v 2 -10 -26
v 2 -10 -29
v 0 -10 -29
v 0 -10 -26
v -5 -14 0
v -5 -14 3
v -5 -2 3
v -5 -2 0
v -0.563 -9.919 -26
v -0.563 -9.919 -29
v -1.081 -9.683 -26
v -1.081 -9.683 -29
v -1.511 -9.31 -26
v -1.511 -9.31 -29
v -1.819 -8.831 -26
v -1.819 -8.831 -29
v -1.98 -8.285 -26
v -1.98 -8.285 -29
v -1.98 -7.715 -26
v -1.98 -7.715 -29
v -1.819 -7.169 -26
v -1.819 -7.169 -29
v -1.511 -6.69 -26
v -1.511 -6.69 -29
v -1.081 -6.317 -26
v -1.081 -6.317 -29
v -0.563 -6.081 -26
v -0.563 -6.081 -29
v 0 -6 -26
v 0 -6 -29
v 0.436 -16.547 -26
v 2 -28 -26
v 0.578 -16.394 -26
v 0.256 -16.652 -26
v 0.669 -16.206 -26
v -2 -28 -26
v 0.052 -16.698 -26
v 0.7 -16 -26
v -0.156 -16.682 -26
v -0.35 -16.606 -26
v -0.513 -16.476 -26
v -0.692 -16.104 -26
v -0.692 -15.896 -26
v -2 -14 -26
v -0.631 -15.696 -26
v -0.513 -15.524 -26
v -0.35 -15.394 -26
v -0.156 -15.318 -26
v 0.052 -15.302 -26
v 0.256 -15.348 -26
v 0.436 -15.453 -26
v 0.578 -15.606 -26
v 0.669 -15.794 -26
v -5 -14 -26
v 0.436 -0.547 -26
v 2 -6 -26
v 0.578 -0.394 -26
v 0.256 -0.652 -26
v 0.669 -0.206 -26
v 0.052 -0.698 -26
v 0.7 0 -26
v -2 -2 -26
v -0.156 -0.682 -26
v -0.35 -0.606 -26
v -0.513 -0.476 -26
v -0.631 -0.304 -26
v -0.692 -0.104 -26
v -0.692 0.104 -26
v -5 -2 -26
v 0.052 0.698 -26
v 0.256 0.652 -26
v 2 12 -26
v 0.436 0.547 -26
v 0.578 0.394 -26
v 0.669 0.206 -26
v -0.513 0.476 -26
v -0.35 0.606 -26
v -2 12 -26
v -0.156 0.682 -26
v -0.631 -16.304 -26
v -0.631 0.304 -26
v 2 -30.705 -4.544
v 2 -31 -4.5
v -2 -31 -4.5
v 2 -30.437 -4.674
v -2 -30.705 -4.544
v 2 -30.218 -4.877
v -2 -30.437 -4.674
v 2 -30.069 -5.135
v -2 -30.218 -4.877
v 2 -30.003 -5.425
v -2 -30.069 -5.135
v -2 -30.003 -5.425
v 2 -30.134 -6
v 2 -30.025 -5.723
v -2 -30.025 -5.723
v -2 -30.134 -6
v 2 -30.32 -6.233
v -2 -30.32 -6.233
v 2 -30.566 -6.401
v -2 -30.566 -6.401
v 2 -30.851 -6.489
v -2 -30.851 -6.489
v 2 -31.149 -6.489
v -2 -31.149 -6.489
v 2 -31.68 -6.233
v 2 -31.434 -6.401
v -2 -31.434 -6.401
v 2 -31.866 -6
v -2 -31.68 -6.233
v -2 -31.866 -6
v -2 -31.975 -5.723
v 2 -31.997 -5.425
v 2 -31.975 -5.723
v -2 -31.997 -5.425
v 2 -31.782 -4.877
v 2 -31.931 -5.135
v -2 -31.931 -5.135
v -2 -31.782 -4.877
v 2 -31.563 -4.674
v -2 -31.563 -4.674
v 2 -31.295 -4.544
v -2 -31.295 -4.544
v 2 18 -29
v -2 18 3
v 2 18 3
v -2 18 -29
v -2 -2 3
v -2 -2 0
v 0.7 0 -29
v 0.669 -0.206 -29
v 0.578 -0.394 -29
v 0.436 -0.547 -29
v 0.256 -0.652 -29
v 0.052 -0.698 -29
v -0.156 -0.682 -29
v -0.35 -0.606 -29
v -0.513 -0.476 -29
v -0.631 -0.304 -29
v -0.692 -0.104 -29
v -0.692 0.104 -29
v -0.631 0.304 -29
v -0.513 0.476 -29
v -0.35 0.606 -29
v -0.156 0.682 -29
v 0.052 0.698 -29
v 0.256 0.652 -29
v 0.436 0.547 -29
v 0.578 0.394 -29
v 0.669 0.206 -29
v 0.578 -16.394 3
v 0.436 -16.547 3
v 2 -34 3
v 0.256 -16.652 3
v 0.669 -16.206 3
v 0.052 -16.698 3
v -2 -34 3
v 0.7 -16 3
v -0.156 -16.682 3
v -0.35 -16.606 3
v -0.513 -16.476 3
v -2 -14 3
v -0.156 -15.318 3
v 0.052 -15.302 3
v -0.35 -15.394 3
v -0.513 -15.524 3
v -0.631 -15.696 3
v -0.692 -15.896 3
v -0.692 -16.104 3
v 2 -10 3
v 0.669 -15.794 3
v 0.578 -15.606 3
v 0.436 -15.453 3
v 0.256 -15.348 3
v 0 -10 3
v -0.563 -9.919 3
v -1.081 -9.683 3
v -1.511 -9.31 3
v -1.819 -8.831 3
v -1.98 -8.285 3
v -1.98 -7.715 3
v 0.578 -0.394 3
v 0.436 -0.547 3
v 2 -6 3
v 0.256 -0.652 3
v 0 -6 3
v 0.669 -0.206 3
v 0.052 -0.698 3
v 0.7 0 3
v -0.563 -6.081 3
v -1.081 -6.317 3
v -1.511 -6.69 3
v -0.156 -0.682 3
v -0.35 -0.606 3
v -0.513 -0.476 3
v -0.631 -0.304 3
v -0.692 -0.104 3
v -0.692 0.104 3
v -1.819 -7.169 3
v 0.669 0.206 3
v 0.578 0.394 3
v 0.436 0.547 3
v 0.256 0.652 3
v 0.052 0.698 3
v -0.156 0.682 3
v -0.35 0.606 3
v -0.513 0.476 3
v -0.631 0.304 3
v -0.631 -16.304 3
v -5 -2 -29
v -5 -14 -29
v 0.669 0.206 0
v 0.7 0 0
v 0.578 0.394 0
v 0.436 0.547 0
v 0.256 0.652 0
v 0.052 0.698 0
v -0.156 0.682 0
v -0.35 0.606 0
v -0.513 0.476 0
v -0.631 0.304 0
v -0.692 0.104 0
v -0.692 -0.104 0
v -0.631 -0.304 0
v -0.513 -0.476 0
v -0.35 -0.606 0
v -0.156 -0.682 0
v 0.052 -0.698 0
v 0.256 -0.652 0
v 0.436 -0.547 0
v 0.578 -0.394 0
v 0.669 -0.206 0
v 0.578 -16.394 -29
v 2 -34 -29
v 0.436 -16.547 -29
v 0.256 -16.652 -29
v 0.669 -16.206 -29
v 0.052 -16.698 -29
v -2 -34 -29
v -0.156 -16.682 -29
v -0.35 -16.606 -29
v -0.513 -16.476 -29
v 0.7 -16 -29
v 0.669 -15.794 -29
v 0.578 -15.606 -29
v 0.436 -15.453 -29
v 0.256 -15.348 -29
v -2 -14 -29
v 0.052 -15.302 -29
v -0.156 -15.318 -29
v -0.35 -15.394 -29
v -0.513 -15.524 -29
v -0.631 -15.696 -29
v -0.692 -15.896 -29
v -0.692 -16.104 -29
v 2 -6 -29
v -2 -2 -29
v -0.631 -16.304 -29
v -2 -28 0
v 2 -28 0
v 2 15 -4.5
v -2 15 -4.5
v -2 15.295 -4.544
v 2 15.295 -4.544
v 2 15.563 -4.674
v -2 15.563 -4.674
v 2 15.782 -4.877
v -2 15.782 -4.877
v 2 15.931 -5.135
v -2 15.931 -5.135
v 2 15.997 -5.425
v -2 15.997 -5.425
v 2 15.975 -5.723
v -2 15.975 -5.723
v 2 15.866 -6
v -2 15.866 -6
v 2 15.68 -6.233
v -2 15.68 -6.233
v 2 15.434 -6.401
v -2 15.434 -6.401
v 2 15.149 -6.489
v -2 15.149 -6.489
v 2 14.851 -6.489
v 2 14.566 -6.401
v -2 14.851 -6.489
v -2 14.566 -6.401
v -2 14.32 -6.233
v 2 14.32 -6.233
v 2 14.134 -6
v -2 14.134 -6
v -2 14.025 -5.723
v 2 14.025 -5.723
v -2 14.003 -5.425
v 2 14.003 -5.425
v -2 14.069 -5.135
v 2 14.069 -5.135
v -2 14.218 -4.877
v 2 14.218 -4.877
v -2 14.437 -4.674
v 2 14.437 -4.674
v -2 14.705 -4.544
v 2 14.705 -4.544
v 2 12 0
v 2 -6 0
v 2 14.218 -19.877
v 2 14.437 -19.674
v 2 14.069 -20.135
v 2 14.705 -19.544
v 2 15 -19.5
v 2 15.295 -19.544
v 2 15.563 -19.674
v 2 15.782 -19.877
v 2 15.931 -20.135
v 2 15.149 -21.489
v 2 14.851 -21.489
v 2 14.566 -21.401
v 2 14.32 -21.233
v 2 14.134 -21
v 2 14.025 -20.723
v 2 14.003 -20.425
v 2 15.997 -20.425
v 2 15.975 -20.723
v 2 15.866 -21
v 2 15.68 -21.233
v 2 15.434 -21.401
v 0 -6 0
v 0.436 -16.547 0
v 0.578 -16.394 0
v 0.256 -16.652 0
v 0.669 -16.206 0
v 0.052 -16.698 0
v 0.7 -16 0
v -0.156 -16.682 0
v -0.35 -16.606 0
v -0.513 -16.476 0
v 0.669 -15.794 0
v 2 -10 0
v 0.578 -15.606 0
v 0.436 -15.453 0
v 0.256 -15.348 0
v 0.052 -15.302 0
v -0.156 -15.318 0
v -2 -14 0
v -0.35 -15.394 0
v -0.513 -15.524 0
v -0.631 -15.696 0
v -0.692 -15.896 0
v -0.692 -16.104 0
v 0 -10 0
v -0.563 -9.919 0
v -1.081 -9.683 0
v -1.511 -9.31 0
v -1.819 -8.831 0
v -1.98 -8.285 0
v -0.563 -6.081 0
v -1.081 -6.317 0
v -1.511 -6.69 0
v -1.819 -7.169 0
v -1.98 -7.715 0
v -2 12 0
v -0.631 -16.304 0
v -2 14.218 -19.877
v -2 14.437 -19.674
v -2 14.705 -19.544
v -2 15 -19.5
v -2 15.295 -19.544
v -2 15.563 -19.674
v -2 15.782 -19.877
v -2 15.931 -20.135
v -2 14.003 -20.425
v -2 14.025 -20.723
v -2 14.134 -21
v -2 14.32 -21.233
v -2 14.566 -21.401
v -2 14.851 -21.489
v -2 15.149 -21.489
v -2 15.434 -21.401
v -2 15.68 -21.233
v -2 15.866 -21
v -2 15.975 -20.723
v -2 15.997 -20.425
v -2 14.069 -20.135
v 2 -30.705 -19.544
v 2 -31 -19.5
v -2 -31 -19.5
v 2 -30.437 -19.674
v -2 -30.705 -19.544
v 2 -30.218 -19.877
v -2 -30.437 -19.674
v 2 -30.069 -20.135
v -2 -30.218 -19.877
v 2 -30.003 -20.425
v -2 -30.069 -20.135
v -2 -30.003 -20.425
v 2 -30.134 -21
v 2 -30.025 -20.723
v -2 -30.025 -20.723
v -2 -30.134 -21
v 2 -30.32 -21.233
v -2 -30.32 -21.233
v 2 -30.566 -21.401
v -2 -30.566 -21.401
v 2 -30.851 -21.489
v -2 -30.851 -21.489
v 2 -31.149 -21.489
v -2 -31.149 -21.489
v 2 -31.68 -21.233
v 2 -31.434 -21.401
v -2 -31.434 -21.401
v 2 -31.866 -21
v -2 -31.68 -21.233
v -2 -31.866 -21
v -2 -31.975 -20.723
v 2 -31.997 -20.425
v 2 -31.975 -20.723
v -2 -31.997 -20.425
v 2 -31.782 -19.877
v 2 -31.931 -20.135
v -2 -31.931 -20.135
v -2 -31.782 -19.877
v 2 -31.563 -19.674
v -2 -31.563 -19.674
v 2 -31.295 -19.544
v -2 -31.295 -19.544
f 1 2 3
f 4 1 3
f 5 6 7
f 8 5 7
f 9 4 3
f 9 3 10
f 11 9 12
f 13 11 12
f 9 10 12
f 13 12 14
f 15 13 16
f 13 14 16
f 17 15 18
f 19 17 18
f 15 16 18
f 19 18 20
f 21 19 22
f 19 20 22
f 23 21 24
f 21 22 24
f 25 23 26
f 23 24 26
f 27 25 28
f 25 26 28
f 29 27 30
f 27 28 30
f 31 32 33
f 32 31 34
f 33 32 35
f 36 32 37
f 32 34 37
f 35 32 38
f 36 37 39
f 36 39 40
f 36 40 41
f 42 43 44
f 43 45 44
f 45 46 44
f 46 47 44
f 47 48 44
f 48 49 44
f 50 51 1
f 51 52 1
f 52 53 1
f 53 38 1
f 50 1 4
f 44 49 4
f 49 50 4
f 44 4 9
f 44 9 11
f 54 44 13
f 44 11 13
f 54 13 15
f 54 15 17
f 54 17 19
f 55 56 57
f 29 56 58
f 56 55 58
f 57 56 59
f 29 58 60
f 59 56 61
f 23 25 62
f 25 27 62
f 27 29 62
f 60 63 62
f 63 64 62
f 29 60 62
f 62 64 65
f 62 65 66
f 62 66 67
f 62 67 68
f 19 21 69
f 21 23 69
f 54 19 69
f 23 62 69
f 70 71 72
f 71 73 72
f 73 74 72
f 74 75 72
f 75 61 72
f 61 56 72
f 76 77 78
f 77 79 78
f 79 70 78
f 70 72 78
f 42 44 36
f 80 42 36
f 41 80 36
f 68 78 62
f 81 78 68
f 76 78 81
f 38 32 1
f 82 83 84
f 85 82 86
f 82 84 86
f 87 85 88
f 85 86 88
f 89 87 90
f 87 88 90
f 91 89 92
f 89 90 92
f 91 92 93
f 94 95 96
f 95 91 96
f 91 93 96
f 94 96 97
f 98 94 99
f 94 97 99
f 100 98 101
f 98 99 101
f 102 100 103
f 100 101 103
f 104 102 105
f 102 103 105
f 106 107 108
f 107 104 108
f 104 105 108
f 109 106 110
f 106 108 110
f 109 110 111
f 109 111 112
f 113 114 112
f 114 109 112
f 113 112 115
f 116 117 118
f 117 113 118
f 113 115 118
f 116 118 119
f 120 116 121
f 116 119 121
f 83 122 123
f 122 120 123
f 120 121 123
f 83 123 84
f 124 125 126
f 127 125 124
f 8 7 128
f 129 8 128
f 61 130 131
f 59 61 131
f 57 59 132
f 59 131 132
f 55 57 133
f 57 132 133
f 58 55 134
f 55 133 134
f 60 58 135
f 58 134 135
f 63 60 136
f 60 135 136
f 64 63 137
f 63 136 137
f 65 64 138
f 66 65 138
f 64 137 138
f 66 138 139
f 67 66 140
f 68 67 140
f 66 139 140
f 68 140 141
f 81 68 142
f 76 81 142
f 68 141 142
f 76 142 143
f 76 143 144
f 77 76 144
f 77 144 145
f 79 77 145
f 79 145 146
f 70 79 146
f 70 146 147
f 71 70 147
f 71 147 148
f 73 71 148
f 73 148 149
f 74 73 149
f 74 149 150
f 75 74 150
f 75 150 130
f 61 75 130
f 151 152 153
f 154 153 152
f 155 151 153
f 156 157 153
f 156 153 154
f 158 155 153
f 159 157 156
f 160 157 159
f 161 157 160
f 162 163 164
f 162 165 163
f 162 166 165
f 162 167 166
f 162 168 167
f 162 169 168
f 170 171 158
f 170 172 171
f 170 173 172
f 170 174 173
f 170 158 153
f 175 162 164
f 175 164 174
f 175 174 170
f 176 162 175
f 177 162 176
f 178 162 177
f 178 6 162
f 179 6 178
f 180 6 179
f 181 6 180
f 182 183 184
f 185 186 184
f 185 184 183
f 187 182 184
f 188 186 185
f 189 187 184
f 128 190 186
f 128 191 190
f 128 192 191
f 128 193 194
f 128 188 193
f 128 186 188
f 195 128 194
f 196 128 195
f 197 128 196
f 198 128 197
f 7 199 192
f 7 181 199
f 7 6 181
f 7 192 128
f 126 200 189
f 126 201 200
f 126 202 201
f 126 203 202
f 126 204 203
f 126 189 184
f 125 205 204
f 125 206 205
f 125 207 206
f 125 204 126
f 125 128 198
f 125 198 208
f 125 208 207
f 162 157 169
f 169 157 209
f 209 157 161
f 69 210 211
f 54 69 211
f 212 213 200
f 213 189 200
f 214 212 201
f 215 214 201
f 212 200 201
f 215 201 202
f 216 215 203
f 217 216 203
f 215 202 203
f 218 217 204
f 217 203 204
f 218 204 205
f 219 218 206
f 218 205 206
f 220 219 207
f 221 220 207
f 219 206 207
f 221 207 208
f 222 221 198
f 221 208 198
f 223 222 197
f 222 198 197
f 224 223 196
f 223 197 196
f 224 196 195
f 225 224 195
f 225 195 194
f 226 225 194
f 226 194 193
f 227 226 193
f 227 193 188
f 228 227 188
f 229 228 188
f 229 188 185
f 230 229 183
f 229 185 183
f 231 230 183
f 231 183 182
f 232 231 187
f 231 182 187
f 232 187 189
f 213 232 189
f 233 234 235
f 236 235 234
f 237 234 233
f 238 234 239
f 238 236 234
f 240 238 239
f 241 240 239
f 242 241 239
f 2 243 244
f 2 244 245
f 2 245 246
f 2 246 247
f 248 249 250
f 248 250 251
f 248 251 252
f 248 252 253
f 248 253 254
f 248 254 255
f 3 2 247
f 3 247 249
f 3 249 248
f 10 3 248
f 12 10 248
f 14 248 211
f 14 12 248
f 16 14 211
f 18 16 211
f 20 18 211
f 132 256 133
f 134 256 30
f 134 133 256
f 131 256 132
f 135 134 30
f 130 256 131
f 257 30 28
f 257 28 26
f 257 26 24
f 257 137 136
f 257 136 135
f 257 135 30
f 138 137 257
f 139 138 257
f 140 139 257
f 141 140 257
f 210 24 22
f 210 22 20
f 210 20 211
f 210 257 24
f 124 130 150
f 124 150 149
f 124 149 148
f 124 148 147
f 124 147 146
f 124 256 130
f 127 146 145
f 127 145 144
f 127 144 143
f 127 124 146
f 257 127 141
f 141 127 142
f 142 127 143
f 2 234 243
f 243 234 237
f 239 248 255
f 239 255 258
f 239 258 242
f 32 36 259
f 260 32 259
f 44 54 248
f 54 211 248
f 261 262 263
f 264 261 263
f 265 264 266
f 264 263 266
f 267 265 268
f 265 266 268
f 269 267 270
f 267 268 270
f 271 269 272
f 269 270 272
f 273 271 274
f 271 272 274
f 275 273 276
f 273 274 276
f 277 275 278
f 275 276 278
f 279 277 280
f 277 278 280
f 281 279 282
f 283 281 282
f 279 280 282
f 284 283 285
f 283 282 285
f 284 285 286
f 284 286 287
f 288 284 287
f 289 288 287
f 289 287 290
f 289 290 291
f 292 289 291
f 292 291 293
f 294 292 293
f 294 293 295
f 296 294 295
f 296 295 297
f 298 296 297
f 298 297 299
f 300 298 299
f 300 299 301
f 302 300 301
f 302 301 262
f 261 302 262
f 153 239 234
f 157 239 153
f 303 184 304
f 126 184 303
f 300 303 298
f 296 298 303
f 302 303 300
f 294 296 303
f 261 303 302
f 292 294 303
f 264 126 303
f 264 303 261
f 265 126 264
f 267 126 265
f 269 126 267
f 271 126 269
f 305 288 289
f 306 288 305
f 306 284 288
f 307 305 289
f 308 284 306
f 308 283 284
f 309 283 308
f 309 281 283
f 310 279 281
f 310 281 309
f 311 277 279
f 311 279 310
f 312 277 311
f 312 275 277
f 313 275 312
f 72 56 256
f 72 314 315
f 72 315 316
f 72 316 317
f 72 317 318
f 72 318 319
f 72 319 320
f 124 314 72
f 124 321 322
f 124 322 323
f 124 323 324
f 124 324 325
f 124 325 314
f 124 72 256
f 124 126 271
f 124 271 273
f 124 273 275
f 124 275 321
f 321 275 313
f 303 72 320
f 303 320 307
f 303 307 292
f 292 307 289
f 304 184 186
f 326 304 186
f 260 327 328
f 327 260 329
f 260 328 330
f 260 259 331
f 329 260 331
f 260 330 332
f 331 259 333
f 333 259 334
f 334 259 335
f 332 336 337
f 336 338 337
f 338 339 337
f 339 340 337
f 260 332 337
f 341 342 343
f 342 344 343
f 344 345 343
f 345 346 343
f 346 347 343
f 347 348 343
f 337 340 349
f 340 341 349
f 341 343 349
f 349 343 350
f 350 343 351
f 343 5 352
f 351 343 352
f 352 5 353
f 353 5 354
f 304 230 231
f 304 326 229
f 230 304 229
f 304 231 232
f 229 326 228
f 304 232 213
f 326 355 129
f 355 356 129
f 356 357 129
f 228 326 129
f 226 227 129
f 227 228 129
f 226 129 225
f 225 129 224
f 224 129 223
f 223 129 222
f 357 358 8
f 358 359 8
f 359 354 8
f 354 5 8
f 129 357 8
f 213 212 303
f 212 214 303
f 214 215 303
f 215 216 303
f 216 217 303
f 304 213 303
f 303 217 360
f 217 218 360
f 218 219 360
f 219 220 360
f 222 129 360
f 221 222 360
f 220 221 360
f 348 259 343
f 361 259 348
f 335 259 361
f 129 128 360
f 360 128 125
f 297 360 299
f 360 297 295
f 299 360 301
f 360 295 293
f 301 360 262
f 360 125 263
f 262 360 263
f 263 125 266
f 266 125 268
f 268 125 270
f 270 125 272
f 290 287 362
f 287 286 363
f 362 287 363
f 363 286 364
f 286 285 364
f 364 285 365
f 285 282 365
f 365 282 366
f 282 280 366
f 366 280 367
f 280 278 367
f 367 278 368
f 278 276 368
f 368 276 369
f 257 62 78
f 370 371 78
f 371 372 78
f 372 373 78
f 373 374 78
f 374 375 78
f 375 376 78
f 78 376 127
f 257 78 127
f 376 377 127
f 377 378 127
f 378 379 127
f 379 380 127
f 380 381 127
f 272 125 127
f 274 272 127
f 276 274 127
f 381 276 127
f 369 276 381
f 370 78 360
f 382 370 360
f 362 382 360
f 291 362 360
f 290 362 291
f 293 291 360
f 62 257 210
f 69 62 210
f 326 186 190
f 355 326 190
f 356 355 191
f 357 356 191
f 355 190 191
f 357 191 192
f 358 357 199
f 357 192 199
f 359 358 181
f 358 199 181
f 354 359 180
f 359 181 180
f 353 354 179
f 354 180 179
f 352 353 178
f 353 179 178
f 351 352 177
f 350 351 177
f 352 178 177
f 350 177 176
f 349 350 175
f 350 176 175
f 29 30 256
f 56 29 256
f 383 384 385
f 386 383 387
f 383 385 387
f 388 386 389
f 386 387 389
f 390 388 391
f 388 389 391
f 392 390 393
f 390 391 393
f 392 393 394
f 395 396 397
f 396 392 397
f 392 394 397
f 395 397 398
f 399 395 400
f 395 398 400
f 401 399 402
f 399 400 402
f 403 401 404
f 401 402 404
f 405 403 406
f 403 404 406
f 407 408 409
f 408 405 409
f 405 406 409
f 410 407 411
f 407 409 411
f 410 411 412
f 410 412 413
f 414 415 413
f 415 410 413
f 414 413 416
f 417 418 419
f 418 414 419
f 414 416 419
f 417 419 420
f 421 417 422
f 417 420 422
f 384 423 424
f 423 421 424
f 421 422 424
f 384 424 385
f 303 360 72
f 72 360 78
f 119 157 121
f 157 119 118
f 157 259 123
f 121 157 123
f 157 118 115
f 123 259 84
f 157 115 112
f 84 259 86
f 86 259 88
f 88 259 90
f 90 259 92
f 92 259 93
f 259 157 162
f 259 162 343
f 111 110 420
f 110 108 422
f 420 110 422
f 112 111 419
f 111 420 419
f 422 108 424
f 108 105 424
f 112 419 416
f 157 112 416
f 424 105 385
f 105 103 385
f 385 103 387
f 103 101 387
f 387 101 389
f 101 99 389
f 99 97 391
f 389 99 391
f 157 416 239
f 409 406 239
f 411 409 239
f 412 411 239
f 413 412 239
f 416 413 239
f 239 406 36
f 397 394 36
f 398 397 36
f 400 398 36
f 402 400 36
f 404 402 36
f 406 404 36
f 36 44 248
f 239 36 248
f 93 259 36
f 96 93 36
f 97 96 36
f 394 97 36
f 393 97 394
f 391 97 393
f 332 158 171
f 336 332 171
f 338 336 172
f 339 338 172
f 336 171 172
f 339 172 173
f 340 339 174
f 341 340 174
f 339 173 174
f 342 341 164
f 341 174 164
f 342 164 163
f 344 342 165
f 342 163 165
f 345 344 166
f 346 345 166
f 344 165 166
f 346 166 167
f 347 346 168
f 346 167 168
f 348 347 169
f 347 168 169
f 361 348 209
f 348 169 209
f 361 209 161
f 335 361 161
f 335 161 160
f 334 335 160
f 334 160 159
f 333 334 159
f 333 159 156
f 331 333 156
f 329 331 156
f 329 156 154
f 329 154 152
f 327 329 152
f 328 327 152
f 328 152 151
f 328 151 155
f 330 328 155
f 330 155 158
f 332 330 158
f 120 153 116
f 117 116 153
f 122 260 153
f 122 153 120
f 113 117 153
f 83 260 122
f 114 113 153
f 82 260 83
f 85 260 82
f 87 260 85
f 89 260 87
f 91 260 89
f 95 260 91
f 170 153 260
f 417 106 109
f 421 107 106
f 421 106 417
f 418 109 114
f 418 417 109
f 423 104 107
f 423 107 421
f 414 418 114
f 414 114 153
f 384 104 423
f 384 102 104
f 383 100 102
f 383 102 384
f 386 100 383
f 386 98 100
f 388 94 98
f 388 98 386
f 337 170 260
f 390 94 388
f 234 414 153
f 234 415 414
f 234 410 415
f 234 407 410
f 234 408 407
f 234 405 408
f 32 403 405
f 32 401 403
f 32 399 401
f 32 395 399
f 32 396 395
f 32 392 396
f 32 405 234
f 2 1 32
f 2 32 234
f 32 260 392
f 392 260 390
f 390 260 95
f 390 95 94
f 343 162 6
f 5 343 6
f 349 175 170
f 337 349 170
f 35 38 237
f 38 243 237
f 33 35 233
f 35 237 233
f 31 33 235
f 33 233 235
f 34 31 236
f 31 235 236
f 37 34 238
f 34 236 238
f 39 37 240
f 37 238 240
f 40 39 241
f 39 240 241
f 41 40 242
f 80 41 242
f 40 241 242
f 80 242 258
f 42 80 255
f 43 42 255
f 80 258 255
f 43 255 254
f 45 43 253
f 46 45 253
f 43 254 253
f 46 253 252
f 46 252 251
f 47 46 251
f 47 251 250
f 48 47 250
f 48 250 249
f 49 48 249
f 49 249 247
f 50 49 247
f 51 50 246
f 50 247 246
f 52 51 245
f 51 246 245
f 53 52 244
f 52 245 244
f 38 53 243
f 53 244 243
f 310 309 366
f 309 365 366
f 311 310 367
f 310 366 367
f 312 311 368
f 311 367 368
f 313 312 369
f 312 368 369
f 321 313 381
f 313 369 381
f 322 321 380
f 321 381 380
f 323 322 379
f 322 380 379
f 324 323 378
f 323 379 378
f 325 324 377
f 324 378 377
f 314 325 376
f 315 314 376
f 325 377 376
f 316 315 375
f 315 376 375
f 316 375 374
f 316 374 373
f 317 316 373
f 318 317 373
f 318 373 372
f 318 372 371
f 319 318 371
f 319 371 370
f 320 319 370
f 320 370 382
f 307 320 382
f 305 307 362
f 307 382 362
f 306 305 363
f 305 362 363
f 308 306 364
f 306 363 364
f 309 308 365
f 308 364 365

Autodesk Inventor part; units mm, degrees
ref_plane "YZ Plane" through (0, 0, 0) normal (1, 0, 0) x (0, 1, 0)
ref_plane "XZ Plane" through (0, 0, 0) normal (0, 1, 0) x (-1, 0, 0)
ref_plane "XY Plane" through (0, 0, 0) normal (0, 0, 1) x (1, 0, 0)
ref_plane "Work Plane1" through (0, -18, -3) normal (1, 0, 0) x (0, 0, -1)
sketch "Sketch2" plane through (0, -18, -3) normal (1, 0, 0) x (0, 0, -1)
  line L0 (-2.3324, 4.2554) -> (0, 4.2554) projected
  arc A0 (-3, 4) -> (-2.3324, 4.2554) centre (-3, 5) ccw projected
  line L1 (-3, 0.5) -> (-3, 4) projected
  line L2 (0, 0.5) -> (-3, 0.5) projected
  line L3 (0, 4.2554) -> (0, 0.5) projected
  line L4 (0, 15.7446) -> (-2.3324, 15.7446) projected
  line L5 (0, 19.5) -> (0, 15.7446) projected
  line L6 (-3, 19.5) -> (0, 19.5) projected
  line L7 (-3, 16) -> (-3, 19.5) projected
  arc A1 (-2.3324, 15.7446) -> (-3, 16) centre (-3, 15) ccw projected
  line L8 (20, 4.2554) -> (22.3324, 4.2554) projected
  line L9 (20, 0.5) -> (20, 4.2554) projected
  line L10 (23, 0.5) -> (20, 0.5) projected
  line L11 (23, 4) -> (23, 0.5) projected
  arc A2 (22.3324, 4.2554) -> (23, 4) centre (23, 5) ccw projected
  line L12 (22.3324, 15.7446) -> (20, 15.7446) projected
  arc A3 (23, 16) -> (22.3324, 15.7446) centre (23, 15) ccw projected
  line L13 (23, 19.5) -> (23, 16) projected
  line L14 (20, 19.5) -> (23, 19.5) projected
  line L15 (20, 15.7446) -> (20, 19.5) projected
  line L16 (20, 4.2554) -> (20, 15.7446)
  line L17 (0, 15.7446) -> (0, 4.2554)
  line L18 (20, 10) -> (0, 10)
  line L19 (23, -10) -> (-3, -10)
  line L20 (-3, -10) -> (-3, 30)
  line L21 (-3, 30) -> (23, 30)
  line L22 (23, 30) -> (23, -10)
  line L23 (23, -10) -> (-3, 30) construction
  line L24 (-3, -10) -> (23, 30) construction
  line L25 (26, -16) -> (-6, -16)
  line L26 (-6, -16) -> (-6, 36)
  line L27 (-6, 36) -> (26, 36)
  line L28 (26, 36) -> (26, -16)
  line L29 (26, -16) -> (-6, 36) construction
  line L30 (-6, -16) -> (26, 36) construction
  point P0 (-3, 18)
  point P1 (10, 10)
  point P2 (-3, 4)
  dimension "d2" = 26
  dimension "d3" = 40
  dimension "d4" = 6
  dimension "d5" = 3
extrude "Extrusion1" add sketch "Sketch2" along normal mid plane 4
ref_plane "Work Plane2" through (-2, -34, -13) normal (0, 0, 1) x (1, 0, 0)
sketch "Sketch3" plane through (-2, -34, 3) normal (0, 0, 1) x (1, 0, 0)
  circle A0 centre (2, 26) radius 1.5 projected
  line L0 (0, 0) -> (4, 0) projected
  line L1 (4, 52) -> (4, 0) projected
  line L2 (0, 52) -> (4, 52) projected
  line L3 (0, 0) -> (0, 52) projected
  line L4 (7, 20) -> (-3, 20)
  line L5 (-3, 20) -> (-3, 32)
  line L6 (-3, 32) -> (7, 32)
  line L7 (7, 32) -> (7, 20)
  line L8 (7, 20) -> (-3, 32) construction
  line L9 (-3, 20) -> (7, 32) construction
  point P0 (2, 34)
  point P1 (0, 20)
  point P2 (0, 32)
  dimension "d8" = 10
  dimension "d9" = 12
extrude "Extrusion2" add sketch "Sketch3" against normal up to surface (3 mm away) contours L4 L5 L6 L3
sketch "Sketch4" plane through (-2, -34, 3) normal (0, 0, 1) x (1, 0, 0)
  circle A0 centre (2, 18) radius 0.7 projected
  circle A1 centre (2, 34) radius 0.7 projected
  circle A2 centre (2, 26) radius 1.5 projected
  line L0 (2, 26) -> (6, 26) construction
  line L1 (2, 24) -> (6, 24)
  line L2 (6, 28) -> (2, 28)
  arc A3 (2, 28) -> (2, 24) centre (2, 26) ccw
  arc A4 (6, 24) -> (6, 28) centre (6, 26) ccw
  point P0 (4, 26)
  dimension "d12" = 4
  dimension "d13" = 4
extrude "Extrusion3" cut sketch "Sketch4" against normal blind 4 contours A0 | A1 | A2 | A3 L2 A4 L1
mirror "Mirror1" about plane through (-2, -34, -13) normal (0, 0, 1) of "Extrusion3", "Extrusion2"
sketch "Sketch5" plane through (-2, -18, -3) normal (-1, 0, 0) x (0, 0, 1)
  line L0 (-26, 16) -> (-23, 16) projected
  line L1 (-23, 16) -> (-23, 30) projected
  line L2 (-23, 30) -> (3, 30) projected
  line L3 (3, 30) -> (3, 16) projected
  line L4 (3, 16) -> (6, 16) projected
  line L5 (6, 16) -> (6, 36) projected
  line L6 (6, 36) -> (-26, 36) projected
  line L7 (-26, 36) -> (-26, 16) projected
  line L8 (3, 16) -> (3, 4) projected
  line L9 (-23, 16) -> (-23, 4) projected
  line L10 (3, 10) -> (-23, 10)
  line L11 (-2.5, -13) -> (-17.5, -13)
  line L12 (-17.5, -13) -> (-17.5, 33)
  line L13 (-17.5, 33) -> (-2.5, 33)
  line L14 (-2.5, 33) -> (-2.5, -13)
  line L15 (-2.5, -13) -> (-17.5, 33) construction
  line L16 (-17.5, -13) -> (-2.5, 33) construction
  line L17 (-23, 30) -> (3, 30) projected
  circle A0 centre (-2.5, 33) radius 1
  circle A1 centre (-17.5, 33) radius 1
  point P0 (3, 18)
  point P1 (-10, 10)
  dimension "d16" = 15
  dimension "d17" = 46
  dimension "d18" = 2
  dimension "d19" = 2
extrude "Extrusion4" cut sketch "Sketch5" against normal blind 4 contours A1 L13 L12 | L12 L13 A1 | A0 L13 L14 | L14 L13 A0
ref_plane "Work Plane3" through (-2, -8, 3) normal (0, 1, 0) x (1, 0, 0)
mirror "Mirror2" about plane through (-2, -8, 3) normal (0, 1, 0) of "Extrusion4"
properties part number "cpr_shell_1"
